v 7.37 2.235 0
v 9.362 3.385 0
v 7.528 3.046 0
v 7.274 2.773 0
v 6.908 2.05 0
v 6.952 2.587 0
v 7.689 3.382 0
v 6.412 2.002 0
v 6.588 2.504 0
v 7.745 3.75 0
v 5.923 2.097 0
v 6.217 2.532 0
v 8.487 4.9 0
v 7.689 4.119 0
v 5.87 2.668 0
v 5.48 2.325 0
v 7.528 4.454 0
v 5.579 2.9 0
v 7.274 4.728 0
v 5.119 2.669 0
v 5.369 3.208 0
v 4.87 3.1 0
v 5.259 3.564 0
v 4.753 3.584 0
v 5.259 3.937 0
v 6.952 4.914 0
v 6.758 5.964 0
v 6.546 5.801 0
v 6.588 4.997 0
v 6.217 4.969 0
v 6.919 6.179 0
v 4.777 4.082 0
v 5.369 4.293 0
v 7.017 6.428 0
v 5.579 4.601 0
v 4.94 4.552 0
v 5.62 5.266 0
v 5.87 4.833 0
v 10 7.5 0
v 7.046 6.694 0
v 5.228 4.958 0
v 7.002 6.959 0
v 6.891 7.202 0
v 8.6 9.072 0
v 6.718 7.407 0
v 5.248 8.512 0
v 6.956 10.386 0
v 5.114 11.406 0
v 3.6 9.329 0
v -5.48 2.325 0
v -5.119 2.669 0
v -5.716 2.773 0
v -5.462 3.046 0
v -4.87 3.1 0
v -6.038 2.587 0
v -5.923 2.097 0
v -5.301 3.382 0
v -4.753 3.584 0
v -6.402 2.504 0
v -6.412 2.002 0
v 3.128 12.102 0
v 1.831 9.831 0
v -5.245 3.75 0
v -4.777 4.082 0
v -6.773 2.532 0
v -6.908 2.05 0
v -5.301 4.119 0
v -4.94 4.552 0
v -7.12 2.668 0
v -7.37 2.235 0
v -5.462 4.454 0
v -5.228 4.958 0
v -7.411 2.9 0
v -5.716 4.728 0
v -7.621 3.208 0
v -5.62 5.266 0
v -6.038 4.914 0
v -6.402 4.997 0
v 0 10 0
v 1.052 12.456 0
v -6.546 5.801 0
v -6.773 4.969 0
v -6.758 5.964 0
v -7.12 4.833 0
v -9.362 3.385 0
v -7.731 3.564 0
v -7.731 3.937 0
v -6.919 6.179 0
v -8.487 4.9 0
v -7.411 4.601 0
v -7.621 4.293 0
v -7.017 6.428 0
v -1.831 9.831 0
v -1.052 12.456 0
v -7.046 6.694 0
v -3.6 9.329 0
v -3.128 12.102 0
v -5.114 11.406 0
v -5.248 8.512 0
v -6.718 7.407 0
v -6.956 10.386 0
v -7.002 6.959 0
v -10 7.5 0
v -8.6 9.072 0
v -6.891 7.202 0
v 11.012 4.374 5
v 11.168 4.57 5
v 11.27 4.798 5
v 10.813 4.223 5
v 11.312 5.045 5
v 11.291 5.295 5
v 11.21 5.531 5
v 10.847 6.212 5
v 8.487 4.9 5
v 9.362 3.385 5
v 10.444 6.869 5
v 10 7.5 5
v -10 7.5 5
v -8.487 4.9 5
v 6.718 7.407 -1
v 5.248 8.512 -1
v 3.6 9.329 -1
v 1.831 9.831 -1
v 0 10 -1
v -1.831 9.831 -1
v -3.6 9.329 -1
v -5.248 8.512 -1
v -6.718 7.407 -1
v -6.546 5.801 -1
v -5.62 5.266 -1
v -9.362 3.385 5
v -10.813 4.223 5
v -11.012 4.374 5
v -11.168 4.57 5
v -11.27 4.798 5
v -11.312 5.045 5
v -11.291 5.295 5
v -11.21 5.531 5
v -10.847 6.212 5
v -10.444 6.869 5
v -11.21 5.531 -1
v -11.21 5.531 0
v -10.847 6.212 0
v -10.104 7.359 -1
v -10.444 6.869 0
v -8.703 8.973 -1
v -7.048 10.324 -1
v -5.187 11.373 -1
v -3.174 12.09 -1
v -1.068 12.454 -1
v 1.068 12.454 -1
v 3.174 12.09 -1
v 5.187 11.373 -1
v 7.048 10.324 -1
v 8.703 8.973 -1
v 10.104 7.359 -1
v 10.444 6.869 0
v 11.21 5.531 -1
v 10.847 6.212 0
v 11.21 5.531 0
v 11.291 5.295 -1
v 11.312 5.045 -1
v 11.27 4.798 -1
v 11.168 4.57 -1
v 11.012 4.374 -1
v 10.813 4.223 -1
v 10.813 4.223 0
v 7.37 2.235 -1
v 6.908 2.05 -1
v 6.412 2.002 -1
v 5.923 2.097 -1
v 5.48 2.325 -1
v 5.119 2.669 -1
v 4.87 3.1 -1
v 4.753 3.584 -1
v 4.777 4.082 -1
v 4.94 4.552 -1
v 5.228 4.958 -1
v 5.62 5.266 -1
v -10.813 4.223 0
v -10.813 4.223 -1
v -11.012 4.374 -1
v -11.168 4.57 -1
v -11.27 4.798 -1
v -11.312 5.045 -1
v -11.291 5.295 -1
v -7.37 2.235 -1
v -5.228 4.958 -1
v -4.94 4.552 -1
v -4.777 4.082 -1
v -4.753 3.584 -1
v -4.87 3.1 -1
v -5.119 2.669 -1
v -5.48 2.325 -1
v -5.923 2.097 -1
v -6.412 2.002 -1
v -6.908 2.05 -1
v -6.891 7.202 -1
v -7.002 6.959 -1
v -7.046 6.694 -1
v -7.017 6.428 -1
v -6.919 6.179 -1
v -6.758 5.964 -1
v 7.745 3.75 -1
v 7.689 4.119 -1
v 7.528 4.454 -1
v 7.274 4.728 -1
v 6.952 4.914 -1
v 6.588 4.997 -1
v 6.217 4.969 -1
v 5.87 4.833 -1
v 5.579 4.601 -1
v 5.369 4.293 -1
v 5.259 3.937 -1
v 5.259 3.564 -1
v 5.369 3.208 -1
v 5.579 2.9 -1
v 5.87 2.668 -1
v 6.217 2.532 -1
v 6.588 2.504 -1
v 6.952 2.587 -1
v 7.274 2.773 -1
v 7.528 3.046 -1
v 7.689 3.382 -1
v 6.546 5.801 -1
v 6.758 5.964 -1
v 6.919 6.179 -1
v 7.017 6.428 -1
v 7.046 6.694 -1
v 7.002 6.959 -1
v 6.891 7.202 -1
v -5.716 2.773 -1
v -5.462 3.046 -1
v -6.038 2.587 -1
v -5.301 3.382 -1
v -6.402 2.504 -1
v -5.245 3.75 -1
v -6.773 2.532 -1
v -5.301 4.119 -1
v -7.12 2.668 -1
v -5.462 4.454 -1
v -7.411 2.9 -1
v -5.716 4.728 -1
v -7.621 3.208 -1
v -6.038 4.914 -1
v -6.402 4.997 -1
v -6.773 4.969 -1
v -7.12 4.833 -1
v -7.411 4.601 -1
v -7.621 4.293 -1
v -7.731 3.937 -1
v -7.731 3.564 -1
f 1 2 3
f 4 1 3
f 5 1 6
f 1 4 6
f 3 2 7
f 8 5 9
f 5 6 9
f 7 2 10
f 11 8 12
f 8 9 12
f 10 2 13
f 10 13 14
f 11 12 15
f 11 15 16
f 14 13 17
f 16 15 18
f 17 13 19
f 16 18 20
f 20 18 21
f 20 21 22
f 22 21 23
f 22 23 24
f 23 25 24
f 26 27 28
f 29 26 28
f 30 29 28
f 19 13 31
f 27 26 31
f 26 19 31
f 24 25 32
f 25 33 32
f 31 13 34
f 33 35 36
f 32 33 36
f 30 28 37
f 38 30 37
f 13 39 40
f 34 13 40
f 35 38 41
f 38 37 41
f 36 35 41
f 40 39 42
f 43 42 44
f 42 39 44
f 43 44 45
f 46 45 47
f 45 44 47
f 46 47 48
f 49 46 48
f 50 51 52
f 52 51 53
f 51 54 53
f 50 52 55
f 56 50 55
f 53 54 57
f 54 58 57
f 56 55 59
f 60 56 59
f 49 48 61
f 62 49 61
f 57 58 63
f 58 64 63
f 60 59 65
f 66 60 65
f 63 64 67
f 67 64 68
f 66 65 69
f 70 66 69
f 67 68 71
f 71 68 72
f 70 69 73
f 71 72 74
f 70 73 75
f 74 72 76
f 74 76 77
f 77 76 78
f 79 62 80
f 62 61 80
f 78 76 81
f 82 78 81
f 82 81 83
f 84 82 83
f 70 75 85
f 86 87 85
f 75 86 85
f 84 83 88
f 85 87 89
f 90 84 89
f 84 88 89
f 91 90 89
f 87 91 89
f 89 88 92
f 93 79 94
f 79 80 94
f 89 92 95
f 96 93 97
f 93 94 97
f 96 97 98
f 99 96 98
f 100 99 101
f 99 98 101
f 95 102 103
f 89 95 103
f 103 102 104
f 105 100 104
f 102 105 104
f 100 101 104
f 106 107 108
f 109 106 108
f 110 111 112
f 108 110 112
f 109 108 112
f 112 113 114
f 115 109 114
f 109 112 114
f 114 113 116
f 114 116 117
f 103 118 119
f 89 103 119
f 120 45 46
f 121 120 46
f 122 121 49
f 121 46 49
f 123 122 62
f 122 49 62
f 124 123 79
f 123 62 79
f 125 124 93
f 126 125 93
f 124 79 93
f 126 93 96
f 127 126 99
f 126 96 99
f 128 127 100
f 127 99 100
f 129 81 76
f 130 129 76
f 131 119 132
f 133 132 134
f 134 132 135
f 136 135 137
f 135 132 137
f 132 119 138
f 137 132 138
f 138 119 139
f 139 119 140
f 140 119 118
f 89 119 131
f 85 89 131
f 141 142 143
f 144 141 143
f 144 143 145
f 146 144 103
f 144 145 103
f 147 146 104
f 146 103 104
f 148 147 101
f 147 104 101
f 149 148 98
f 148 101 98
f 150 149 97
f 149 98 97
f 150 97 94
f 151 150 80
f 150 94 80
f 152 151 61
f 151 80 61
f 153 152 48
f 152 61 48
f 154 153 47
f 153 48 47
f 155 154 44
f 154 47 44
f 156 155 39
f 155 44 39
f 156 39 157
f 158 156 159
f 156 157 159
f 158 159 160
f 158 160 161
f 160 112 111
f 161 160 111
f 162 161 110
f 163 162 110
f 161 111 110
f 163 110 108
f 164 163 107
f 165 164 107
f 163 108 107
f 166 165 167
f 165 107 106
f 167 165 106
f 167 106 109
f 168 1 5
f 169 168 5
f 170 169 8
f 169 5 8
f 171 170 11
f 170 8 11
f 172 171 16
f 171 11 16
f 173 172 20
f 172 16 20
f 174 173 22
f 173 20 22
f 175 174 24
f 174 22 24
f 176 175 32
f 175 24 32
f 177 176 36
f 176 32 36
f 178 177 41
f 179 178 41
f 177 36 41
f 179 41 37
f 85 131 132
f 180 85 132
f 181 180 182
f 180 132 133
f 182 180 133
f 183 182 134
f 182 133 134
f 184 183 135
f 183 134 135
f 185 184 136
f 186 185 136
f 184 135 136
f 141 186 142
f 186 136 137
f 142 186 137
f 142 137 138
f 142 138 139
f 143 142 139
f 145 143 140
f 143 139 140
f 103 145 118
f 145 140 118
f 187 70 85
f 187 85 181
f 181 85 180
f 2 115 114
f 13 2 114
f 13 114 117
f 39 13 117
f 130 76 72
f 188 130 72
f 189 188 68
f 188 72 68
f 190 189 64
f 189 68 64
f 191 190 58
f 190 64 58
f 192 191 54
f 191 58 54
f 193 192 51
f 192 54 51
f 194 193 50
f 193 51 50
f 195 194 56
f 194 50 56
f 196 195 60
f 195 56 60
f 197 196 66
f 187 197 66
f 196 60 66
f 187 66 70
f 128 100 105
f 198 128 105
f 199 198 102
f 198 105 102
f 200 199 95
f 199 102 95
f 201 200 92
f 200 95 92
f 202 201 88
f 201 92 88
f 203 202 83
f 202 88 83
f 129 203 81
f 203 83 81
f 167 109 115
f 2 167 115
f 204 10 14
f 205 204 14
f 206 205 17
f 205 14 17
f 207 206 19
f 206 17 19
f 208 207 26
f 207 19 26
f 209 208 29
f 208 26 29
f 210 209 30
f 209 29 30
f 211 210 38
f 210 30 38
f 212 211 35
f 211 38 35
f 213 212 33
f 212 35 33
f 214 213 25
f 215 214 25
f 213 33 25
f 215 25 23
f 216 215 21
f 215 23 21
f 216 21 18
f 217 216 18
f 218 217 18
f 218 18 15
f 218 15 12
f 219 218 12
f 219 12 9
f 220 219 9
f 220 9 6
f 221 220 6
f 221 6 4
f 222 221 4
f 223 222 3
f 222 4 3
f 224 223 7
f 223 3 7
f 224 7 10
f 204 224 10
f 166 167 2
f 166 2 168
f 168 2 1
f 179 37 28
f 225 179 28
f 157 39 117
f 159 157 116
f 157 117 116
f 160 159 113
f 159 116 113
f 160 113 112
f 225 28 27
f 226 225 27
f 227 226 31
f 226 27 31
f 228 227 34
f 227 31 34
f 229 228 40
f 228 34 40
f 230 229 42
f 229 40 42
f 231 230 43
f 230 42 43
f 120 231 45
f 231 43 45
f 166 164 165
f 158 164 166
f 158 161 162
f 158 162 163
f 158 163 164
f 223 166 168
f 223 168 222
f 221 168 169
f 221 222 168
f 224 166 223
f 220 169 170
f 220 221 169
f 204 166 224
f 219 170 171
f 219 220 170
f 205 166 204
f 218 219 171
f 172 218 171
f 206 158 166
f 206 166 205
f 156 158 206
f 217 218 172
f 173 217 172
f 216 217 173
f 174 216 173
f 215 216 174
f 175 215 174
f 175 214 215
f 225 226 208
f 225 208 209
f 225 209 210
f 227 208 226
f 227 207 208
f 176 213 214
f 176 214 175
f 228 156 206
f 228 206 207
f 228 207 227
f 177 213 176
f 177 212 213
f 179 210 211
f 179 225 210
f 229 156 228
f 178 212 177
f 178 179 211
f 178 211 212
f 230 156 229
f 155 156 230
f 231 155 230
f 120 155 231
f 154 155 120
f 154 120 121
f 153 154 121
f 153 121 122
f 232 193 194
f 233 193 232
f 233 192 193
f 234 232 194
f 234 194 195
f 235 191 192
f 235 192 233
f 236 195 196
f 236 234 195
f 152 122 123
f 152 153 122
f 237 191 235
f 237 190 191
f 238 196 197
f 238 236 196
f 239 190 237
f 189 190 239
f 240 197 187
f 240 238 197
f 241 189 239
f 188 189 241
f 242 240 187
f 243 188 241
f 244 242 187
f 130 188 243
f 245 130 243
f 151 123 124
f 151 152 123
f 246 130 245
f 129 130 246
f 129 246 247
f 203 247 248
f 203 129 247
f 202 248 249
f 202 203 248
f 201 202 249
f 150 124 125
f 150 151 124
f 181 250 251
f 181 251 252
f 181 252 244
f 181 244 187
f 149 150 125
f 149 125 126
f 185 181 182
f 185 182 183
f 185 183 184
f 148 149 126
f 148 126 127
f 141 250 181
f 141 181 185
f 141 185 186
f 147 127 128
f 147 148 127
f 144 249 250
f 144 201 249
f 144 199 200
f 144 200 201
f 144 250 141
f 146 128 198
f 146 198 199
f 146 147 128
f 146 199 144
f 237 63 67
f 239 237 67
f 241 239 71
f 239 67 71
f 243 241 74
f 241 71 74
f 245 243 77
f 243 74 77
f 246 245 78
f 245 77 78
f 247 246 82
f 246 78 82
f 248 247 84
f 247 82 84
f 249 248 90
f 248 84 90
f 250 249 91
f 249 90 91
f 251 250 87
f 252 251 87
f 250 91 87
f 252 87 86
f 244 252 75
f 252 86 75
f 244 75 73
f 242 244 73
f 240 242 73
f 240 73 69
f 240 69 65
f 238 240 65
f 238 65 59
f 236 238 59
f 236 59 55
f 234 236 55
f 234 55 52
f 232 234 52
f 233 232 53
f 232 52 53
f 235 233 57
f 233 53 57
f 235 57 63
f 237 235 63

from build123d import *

# Parameters (mm, degrees)
SKETCH1_R           = 1.25
BOSS_EXTRUDE1_DEPTH = 1
BOSS_EXTRUDE2_START = 5
BOSS_EXTRUDE2_DEPTH = 5


with BuildPart() as part:
    # Sketch1 → Boss-Extrude1 (new body)
    with BuildSketch(Plane.XY):
        with BuildLine():
            Line((10.812920647, 4.222556691), (7.37, 2.234785529))
            ThreePointArc((7.37, 2.234785529), (4.979455543, 2.875329985), (5.62, 5.265874442))
            Line((5.62, 5.265874442), (6.546167381, 5.800597429))
            ThreePointArc((6.546167381, 5.800597429), (7.040499888, 6.560307898), (6.717963757, 7.407358703))
            ThreePointArc((6.717963757, 7.407358703), (0, 10), (-6.717963757, 7.407358703))
            ThreePointArc((-6.717963757, 7.407358703), (-7.040499888, 6.560307898), (-6.546167381, 5.800597429))
            Line((-6.546167381, 5.800597429), (-5.62, 5.265874442))
            ThreePointArc((-5.62, 5.265874442), (-4.979455543, 2.875329985), (-7.37, 2.234785529))
            Line((-7.37, 2.234785529), (-10.812920647, 4.222556691))
            ThreePointArc((-10.812920647, 4.222556691), (-11.269892812, 4.798402367), (-11.209696355, 5.531067494))
            ThreePointArc((-11.209696355, 5.531067494), (0, 12.5), (11.209696355, 5.531067494))
            ThreePointArc((11.209696355, 5.531067494), (11.269892812, 4.798402367), (10.812920647, 4.222556691))
        make_face()
        with Locations((-6.495, 3.750329985)):
            Circle(SKETCH1_R, mode=Mode.SUBTRACT)
        with Locations((6.495, 3.750329985)):
            Circle(SKETCH1_R, mode=Mode.SUBTRACT)
    extrude(amount=-BOSS_EXTRUDE1_DEPTH)

    # Sketch2 → Boss-Extrude2 (add)
    with BuildSketch(Plane.XY.offset(BOSS_EXTRUDE2_START)):
        with BuildLine():
            Line((9.361858429, 3.384785529), (8.486858429, 4.900329985))
            Line((8.486858429, 4.900329985), (10, 7.5))
            ThreePointArc((10, 7.5), (10.650444999, 6.543548069), (11.209696355, 5.531067494))
            ThreePointArc((11.209696355, 5.531067494), (11.269892812, 4.798402367), (10.812920647, 4.222556691))
            Line((10.812920647, 4.222556691), (9.361858429, 3.384785529))
        make_face()
        with BuildLine():
            Line((-9.361858429, 3.384785529), (-10.812920647, 4.222556691))
            ThreePointArc((-10.812920647, 4.222556691), (-11.269892812, 4.798402367), (-11.209696355, 5.531067494))
            ThreePointArc((-11.209696355, 5.531067494), (-10.650444999, 6.543548069), (-10, 7.5))
            Line((-10, 7.5), (-8.486858429, 4.900329985))
            Line((-8.486858429, 4.900329985), (-9.361858429, 3.384785529))
        make_face()
    extrude(amount=-BOSS_EXTRUDE2_DEPTH)


solid = part.part
